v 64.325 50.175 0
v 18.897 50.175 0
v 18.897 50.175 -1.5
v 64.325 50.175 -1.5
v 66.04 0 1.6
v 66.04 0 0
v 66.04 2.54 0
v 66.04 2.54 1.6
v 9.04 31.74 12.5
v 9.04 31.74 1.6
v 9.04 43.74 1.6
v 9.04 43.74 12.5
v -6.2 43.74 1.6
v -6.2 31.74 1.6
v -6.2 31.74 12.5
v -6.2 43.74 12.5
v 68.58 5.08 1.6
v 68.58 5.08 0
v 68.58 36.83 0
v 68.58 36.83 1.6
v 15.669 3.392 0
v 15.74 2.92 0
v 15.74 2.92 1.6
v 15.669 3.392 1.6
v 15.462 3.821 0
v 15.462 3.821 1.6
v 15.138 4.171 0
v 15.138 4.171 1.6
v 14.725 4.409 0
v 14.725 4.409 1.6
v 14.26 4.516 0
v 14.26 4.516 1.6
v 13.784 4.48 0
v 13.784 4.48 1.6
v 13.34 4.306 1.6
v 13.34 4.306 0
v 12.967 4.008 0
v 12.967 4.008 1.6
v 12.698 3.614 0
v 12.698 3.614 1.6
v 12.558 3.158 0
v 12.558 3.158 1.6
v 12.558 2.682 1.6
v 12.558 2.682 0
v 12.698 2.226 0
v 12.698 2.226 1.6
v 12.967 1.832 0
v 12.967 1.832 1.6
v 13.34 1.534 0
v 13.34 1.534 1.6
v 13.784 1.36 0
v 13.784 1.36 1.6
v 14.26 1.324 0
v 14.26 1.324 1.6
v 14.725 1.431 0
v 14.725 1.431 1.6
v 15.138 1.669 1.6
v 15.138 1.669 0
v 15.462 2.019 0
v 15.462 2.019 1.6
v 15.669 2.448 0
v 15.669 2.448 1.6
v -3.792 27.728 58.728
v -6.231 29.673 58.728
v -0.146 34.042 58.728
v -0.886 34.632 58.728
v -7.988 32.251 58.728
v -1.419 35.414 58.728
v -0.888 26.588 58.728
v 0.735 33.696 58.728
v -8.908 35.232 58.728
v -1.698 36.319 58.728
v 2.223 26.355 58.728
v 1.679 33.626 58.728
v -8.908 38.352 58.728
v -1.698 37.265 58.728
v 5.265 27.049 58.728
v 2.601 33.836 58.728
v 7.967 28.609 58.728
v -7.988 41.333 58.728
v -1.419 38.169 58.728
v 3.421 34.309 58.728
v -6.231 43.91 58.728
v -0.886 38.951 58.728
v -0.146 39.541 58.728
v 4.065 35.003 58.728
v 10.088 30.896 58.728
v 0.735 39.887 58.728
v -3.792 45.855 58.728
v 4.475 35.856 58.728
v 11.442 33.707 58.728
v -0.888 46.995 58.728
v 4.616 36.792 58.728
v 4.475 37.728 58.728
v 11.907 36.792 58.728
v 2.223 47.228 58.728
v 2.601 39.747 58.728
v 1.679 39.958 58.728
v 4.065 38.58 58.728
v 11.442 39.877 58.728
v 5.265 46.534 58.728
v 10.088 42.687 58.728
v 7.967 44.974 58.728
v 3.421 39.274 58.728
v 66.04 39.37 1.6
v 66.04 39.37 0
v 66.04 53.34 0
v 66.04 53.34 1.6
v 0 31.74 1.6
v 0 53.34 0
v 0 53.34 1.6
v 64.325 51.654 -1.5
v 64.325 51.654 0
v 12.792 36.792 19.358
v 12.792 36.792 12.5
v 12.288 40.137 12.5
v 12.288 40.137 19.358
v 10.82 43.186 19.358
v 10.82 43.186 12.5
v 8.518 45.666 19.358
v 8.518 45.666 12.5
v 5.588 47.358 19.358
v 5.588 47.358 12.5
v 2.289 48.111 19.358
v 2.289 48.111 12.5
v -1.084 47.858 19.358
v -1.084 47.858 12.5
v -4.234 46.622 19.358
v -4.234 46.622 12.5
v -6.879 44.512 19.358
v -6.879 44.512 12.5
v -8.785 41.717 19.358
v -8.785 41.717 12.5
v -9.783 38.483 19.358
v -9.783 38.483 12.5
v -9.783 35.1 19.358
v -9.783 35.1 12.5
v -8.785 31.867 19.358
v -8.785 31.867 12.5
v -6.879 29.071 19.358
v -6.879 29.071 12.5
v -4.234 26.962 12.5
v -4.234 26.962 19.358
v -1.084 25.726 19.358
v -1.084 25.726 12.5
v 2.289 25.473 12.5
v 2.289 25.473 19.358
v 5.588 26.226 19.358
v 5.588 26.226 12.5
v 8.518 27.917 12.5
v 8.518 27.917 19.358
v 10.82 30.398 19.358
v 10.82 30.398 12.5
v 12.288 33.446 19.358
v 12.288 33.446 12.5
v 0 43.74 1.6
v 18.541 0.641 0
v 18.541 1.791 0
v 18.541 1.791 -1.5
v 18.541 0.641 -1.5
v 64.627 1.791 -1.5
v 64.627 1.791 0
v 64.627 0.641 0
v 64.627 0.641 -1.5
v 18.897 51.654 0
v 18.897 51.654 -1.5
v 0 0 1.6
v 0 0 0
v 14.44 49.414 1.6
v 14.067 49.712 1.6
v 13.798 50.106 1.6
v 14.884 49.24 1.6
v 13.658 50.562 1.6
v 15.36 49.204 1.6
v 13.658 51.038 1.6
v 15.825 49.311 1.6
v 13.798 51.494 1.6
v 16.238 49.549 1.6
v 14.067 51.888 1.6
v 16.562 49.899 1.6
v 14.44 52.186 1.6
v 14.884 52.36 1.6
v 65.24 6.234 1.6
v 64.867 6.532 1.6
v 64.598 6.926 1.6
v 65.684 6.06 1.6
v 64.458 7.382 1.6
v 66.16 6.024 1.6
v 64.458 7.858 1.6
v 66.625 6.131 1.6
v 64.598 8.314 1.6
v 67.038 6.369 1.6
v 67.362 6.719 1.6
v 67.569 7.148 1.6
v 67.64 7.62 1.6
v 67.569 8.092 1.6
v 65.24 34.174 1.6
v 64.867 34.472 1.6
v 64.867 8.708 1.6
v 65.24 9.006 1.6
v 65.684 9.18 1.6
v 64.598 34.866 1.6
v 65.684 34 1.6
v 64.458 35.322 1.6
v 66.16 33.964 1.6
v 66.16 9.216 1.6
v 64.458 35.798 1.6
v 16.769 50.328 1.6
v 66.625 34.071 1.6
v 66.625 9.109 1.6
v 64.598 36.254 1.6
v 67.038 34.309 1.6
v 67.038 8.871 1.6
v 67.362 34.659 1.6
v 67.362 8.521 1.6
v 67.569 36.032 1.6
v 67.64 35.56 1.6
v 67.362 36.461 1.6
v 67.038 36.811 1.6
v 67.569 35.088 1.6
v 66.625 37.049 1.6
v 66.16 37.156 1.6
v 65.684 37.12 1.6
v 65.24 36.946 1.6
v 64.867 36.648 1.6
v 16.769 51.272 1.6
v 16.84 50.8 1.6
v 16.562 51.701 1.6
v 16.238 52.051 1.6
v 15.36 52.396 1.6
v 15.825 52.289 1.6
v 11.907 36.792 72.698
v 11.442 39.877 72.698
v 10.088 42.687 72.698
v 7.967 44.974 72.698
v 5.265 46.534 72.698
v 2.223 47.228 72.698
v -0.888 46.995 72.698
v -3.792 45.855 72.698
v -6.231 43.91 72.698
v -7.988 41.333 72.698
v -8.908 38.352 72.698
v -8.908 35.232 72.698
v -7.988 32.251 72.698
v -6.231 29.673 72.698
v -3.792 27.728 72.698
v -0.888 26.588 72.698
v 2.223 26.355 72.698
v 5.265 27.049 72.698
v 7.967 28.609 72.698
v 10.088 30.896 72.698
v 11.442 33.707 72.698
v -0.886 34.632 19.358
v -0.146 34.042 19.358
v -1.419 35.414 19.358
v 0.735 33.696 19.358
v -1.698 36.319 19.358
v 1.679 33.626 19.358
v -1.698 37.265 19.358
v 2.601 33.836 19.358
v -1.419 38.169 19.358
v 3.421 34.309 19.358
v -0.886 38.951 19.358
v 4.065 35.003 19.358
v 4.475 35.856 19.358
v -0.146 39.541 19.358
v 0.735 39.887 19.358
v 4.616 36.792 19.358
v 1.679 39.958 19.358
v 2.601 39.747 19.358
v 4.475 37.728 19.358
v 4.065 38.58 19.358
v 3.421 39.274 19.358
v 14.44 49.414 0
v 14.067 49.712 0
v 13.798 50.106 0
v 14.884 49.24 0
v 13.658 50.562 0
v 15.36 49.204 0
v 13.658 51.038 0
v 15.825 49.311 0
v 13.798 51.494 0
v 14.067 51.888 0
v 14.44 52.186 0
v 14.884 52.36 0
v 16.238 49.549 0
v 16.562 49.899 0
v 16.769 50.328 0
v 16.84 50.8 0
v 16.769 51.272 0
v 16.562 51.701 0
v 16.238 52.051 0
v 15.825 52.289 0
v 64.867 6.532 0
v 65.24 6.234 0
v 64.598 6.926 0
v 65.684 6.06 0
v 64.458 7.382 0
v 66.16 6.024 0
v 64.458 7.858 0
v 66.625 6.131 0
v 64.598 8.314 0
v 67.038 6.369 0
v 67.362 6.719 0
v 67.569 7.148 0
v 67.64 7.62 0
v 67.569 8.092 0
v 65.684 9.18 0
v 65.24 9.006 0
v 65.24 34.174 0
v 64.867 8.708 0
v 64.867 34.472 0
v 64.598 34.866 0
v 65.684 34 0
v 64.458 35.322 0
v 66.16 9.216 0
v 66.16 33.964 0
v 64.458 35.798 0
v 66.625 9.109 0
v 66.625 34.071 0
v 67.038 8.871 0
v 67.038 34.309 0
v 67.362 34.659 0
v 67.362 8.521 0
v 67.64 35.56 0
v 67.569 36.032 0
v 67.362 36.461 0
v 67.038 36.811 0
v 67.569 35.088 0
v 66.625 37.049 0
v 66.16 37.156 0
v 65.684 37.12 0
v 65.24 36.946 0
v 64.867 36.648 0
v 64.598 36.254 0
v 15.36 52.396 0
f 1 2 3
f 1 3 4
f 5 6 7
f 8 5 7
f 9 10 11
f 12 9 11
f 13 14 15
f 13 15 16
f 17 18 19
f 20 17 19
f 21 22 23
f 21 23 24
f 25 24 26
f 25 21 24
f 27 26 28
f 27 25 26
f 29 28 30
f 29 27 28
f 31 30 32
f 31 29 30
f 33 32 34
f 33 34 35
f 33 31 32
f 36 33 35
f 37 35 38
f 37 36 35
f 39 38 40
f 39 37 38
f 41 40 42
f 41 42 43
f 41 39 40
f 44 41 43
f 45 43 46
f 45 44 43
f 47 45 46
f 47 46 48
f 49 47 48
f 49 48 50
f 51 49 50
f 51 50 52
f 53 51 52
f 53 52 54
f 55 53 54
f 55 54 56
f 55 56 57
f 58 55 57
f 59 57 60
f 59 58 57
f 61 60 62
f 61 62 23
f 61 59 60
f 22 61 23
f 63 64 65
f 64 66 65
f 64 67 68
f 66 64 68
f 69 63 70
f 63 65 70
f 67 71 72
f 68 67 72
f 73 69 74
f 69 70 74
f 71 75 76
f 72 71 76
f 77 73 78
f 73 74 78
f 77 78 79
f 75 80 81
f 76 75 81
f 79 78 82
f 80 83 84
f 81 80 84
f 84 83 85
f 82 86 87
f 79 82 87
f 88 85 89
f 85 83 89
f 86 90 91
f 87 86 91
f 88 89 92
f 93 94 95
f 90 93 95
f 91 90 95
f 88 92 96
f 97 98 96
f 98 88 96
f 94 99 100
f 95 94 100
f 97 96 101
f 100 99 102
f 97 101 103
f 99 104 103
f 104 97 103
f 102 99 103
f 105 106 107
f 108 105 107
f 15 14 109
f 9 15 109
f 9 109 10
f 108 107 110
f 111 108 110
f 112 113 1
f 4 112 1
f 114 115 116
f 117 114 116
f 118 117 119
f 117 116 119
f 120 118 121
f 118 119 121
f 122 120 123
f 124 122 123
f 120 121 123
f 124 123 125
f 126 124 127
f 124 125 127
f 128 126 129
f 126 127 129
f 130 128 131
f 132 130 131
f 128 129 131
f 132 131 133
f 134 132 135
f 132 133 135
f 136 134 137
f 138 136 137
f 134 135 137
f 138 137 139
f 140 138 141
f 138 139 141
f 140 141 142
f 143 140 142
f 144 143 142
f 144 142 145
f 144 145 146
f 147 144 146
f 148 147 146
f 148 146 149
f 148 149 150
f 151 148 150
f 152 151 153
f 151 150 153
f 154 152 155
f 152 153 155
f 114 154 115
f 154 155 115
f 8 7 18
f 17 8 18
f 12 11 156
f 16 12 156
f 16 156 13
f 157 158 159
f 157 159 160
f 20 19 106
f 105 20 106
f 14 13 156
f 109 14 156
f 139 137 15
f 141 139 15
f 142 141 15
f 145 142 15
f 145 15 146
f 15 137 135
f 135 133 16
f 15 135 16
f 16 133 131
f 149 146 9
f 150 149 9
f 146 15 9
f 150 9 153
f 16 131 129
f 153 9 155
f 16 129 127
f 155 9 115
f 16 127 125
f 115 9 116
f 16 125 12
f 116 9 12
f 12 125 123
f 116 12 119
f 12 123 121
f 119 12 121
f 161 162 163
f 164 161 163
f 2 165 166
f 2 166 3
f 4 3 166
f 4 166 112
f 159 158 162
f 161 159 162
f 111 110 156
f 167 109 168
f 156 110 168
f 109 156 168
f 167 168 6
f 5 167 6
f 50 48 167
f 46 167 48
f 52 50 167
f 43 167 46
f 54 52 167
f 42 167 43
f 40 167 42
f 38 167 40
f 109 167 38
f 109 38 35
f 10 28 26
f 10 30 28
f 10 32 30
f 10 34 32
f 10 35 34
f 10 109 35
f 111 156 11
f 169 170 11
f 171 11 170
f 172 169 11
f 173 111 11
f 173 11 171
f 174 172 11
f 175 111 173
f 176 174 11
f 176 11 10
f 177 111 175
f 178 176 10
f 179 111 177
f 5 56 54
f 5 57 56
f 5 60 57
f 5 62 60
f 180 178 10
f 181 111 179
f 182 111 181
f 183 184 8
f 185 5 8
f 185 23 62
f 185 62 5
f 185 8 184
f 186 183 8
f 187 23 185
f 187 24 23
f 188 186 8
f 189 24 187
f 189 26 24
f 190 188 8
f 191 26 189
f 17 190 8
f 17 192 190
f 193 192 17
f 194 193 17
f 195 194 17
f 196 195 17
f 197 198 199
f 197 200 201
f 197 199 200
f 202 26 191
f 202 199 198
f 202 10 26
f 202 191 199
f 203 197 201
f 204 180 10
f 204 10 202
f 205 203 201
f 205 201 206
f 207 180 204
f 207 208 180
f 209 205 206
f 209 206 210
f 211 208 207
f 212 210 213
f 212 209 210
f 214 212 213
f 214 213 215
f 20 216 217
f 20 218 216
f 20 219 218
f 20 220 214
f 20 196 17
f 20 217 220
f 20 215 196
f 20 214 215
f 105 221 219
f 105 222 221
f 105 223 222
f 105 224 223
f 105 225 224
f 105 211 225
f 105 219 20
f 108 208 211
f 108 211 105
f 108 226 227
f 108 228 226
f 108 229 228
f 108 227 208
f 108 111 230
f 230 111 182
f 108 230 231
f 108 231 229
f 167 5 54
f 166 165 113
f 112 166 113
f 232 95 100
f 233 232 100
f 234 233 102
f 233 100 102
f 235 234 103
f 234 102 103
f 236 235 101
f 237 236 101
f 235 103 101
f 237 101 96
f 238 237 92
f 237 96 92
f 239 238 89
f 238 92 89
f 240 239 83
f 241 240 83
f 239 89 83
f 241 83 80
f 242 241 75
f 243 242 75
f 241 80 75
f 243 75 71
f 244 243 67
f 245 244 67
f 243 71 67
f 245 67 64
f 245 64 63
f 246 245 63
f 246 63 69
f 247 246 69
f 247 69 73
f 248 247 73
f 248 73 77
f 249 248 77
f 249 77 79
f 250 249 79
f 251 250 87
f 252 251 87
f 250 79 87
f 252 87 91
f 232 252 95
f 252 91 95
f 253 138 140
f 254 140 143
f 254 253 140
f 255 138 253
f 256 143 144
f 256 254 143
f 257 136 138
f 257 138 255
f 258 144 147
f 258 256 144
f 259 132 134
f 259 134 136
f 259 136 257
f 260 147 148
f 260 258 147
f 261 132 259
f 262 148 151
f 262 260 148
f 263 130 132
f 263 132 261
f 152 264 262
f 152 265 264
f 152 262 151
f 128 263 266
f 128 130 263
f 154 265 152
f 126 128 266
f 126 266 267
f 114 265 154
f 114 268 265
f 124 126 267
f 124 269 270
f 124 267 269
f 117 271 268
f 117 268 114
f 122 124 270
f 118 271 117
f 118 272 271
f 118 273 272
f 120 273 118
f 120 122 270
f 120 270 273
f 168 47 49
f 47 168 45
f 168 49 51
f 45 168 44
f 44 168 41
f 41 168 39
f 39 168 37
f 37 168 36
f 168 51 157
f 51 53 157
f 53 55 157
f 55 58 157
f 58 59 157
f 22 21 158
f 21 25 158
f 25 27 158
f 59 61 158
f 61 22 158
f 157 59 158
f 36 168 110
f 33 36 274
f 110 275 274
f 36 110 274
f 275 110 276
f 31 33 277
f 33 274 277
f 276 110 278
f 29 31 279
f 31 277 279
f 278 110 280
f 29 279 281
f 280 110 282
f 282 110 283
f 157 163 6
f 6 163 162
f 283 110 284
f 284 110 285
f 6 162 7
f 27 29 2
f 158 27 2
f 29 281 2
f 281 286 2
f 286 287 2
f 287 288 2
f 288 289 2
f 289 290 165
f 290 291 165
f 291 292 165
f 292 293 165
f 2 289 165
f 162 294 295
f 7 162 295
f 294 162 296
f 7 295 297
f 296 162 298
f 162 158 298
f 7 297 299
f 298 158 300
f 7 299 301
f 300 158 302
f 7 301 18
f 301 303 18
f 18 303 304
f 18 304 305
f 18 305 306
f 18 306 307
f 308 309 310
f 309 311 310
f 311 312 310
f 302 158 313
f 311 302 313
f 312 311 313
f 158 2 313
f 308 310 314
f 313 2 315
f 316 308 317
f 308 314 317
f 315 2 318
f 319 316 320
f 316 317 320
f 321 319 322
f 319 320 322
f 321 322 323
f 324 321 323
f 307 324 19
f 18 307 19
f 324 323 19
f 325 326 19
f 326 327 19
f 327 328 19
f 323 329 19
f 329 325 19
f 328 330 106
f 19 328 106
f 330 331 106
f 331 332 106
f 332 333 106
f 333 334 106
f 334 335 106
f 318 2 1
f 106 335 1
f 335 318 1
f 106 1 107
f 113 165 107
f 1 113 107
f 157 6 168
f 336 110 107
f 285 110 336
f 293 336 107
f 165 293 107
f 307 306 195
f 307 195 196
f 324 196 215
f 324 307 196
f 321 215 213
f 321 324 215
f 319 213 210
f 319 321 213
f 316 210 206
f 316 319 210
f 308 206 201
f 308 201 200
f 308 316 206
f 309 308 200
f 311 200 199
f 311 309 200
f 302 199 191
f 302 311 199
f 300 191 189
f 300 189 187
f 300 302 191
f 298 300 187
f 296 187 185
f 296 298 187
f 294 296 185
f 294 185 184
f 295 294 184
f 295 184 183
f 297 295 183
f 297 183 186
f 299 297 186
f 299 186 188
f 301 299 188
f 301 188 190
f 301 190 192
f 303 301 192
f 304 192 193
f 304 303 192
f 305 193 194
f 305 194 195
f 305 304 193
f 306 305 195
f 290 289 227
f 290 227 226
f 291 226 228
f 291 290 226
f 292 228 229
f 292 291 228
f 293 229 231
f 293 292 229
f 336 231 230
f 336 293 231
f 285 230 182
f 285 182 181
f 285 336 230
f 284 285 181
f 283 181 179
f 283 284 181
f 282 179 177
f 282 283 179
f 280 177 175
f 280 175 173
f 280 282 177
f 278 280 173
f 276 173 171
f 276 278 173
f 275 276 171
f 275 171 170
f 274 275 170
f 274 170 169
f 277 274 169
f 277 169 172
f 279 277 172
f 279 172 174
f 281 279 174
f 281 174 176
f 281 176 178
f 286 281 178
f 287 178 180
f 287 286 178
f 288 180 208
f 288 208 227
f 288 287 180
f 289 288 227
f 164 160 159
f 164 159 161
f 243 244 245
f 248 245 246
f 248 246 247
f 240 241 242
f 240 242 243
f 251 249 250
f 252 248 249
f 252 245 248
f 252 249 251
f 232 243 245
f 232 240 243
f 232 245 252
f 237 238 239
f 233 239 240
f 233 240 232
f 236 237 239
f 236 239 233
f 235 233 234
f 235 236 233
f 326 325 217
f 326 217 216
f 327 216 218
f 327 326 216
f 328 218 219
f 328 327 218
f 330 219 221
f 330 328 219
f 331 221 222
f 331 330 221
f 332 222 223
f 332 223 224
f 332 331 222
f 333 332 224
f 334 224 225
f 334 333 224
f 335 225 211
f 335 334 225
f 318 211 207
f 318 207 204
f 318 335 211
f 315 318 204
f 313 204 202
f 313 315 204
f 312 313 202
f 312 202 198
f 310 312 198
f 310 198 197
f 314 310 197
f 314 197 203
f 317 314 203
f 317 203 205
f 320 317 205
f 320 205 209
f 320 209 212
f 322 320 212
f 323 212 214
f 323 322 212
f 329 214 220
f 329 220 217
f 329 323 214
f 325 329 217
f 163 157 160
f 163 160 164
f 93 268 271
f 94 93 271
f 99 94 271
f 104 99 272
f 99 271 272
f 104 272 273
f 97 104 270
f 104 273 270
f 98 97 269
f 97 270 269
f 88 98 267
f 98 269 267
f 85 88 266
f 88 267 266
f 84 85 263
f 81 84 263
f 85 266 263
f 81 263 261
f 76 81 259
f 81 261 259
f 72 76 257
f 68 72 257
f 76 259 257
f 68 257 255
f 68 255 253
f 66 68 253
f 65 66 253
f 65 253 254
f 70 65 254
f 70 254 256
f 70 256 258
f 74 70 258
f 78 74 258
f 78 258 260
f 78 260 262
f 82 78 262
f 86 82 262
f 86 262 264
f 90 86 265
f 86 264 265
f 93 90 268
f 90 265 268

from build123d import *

# Parameters (mm, degrees)
F0_R      = 1.6
F1_DEPTH  = 1.6
F2_W      = 6.2
F2_H      = 12
F2_W_2    = 9.04
F3_DEPTH  = 10.9
F4_W      = 46.085651
F4_H      = 1.150087
F4_W_2    = 45.428462
F4_H_2    = 1.478683
F5_DEPTH  = 1.5
F6_R      = 11.350572
F6_R_2    = 3.232045
F7_DEPTH  = 6.858
F8_R      = 3.175
F9_DEPTH  = 39.37
F10_R     = 10.465691
F10_R_2   = 3.175
F11_DEPTH = 13.97


with BuildPart() as f1:
    # F0 (on Top) → F1 (new body)
    with BuildSketch(Plane.XY):
        Polygon((0, 53.34), (0, 0), (66.04, 0), (66.04, 2.54), (68.58, 5.08), (68.58, 36.83), (66.04, 39.37), (66.04, 53.34), align=None)
        with Locations((14.14, 2.92)):
            Circle(F0_R, mode=Mode.SUBTRACT)
        with Locations((66.04, 7.62)):
            Circle(F0_R, mode=Mode.SUBTRACT)
        with Locations((15.24, 50.8)):
            Circle(F0_R, mode=Mode.SUBTRACT)
        with Locations((66.04, 35.56)):
            Circle(F0_R, mode=Mode.SUBTRACT)
    extrude(amount=F1_DEPTH)

    # F2 (on face) → F3 (join)
    with BuildSketch(Plane.XY.offset(1.6)):
        with Locations((-3.1, 37.74)):
            Rectangle(F2_W, F2_H)
        with Locations((4.52, 37.74)):
            Rectangle(F2_W_2, F2_H)
    extrude(amount=F3_DEPTH)

    # F4 (on face) → F5 (join)
    with BuildSketch(Plane(origin=(0, 0, 0), x_dir=(1, 0, 0), z_dir=(0, 0, -1))):
        with Locations((41.58383, -1.216432)):
            Rectangle(F4_W, F4_H)
        with Locations((41.611146, -50.914244)):
            Rectangle(F4_W_2, F4_H_2)
    extrude(amount=F5_DEPTH)

    # F6 (on face) → F7 (join)
    with BuildSketch(Plane.XY.offset(12.5)):
        with Locations((1.441258, 36.791712)):
            Circle(F6_R)
        with Locations((1.441258, 36.791712)):
            Circle(F6_R_2, mode=Mode.SUBTRACT)
        with Locations((1.441258, 36.791712)):
            Circle(F6_R_2)
    extrude(amount=F7_DEPTH)

    # F8 (on face) → F9 (join)
    with BuildSketch(Plane.XY.offset(19.358)):
        with Locations((1.441258, 36.791712)):
            Circle(F8_R)
    extrude(amount=F9_DEPTH)

    # F10 (on face) → F11 (join)
    with BuildSketch(Plane.XY.offset(58.728)):
        with Locations((1.441258, 36.791712)):
            Circle(F10_R)
        with Locations((1.441258, 36.791712)):
            Circle(F10_R_2)
    extrude(amount=F11_DEPTH)


solid = f1.part
